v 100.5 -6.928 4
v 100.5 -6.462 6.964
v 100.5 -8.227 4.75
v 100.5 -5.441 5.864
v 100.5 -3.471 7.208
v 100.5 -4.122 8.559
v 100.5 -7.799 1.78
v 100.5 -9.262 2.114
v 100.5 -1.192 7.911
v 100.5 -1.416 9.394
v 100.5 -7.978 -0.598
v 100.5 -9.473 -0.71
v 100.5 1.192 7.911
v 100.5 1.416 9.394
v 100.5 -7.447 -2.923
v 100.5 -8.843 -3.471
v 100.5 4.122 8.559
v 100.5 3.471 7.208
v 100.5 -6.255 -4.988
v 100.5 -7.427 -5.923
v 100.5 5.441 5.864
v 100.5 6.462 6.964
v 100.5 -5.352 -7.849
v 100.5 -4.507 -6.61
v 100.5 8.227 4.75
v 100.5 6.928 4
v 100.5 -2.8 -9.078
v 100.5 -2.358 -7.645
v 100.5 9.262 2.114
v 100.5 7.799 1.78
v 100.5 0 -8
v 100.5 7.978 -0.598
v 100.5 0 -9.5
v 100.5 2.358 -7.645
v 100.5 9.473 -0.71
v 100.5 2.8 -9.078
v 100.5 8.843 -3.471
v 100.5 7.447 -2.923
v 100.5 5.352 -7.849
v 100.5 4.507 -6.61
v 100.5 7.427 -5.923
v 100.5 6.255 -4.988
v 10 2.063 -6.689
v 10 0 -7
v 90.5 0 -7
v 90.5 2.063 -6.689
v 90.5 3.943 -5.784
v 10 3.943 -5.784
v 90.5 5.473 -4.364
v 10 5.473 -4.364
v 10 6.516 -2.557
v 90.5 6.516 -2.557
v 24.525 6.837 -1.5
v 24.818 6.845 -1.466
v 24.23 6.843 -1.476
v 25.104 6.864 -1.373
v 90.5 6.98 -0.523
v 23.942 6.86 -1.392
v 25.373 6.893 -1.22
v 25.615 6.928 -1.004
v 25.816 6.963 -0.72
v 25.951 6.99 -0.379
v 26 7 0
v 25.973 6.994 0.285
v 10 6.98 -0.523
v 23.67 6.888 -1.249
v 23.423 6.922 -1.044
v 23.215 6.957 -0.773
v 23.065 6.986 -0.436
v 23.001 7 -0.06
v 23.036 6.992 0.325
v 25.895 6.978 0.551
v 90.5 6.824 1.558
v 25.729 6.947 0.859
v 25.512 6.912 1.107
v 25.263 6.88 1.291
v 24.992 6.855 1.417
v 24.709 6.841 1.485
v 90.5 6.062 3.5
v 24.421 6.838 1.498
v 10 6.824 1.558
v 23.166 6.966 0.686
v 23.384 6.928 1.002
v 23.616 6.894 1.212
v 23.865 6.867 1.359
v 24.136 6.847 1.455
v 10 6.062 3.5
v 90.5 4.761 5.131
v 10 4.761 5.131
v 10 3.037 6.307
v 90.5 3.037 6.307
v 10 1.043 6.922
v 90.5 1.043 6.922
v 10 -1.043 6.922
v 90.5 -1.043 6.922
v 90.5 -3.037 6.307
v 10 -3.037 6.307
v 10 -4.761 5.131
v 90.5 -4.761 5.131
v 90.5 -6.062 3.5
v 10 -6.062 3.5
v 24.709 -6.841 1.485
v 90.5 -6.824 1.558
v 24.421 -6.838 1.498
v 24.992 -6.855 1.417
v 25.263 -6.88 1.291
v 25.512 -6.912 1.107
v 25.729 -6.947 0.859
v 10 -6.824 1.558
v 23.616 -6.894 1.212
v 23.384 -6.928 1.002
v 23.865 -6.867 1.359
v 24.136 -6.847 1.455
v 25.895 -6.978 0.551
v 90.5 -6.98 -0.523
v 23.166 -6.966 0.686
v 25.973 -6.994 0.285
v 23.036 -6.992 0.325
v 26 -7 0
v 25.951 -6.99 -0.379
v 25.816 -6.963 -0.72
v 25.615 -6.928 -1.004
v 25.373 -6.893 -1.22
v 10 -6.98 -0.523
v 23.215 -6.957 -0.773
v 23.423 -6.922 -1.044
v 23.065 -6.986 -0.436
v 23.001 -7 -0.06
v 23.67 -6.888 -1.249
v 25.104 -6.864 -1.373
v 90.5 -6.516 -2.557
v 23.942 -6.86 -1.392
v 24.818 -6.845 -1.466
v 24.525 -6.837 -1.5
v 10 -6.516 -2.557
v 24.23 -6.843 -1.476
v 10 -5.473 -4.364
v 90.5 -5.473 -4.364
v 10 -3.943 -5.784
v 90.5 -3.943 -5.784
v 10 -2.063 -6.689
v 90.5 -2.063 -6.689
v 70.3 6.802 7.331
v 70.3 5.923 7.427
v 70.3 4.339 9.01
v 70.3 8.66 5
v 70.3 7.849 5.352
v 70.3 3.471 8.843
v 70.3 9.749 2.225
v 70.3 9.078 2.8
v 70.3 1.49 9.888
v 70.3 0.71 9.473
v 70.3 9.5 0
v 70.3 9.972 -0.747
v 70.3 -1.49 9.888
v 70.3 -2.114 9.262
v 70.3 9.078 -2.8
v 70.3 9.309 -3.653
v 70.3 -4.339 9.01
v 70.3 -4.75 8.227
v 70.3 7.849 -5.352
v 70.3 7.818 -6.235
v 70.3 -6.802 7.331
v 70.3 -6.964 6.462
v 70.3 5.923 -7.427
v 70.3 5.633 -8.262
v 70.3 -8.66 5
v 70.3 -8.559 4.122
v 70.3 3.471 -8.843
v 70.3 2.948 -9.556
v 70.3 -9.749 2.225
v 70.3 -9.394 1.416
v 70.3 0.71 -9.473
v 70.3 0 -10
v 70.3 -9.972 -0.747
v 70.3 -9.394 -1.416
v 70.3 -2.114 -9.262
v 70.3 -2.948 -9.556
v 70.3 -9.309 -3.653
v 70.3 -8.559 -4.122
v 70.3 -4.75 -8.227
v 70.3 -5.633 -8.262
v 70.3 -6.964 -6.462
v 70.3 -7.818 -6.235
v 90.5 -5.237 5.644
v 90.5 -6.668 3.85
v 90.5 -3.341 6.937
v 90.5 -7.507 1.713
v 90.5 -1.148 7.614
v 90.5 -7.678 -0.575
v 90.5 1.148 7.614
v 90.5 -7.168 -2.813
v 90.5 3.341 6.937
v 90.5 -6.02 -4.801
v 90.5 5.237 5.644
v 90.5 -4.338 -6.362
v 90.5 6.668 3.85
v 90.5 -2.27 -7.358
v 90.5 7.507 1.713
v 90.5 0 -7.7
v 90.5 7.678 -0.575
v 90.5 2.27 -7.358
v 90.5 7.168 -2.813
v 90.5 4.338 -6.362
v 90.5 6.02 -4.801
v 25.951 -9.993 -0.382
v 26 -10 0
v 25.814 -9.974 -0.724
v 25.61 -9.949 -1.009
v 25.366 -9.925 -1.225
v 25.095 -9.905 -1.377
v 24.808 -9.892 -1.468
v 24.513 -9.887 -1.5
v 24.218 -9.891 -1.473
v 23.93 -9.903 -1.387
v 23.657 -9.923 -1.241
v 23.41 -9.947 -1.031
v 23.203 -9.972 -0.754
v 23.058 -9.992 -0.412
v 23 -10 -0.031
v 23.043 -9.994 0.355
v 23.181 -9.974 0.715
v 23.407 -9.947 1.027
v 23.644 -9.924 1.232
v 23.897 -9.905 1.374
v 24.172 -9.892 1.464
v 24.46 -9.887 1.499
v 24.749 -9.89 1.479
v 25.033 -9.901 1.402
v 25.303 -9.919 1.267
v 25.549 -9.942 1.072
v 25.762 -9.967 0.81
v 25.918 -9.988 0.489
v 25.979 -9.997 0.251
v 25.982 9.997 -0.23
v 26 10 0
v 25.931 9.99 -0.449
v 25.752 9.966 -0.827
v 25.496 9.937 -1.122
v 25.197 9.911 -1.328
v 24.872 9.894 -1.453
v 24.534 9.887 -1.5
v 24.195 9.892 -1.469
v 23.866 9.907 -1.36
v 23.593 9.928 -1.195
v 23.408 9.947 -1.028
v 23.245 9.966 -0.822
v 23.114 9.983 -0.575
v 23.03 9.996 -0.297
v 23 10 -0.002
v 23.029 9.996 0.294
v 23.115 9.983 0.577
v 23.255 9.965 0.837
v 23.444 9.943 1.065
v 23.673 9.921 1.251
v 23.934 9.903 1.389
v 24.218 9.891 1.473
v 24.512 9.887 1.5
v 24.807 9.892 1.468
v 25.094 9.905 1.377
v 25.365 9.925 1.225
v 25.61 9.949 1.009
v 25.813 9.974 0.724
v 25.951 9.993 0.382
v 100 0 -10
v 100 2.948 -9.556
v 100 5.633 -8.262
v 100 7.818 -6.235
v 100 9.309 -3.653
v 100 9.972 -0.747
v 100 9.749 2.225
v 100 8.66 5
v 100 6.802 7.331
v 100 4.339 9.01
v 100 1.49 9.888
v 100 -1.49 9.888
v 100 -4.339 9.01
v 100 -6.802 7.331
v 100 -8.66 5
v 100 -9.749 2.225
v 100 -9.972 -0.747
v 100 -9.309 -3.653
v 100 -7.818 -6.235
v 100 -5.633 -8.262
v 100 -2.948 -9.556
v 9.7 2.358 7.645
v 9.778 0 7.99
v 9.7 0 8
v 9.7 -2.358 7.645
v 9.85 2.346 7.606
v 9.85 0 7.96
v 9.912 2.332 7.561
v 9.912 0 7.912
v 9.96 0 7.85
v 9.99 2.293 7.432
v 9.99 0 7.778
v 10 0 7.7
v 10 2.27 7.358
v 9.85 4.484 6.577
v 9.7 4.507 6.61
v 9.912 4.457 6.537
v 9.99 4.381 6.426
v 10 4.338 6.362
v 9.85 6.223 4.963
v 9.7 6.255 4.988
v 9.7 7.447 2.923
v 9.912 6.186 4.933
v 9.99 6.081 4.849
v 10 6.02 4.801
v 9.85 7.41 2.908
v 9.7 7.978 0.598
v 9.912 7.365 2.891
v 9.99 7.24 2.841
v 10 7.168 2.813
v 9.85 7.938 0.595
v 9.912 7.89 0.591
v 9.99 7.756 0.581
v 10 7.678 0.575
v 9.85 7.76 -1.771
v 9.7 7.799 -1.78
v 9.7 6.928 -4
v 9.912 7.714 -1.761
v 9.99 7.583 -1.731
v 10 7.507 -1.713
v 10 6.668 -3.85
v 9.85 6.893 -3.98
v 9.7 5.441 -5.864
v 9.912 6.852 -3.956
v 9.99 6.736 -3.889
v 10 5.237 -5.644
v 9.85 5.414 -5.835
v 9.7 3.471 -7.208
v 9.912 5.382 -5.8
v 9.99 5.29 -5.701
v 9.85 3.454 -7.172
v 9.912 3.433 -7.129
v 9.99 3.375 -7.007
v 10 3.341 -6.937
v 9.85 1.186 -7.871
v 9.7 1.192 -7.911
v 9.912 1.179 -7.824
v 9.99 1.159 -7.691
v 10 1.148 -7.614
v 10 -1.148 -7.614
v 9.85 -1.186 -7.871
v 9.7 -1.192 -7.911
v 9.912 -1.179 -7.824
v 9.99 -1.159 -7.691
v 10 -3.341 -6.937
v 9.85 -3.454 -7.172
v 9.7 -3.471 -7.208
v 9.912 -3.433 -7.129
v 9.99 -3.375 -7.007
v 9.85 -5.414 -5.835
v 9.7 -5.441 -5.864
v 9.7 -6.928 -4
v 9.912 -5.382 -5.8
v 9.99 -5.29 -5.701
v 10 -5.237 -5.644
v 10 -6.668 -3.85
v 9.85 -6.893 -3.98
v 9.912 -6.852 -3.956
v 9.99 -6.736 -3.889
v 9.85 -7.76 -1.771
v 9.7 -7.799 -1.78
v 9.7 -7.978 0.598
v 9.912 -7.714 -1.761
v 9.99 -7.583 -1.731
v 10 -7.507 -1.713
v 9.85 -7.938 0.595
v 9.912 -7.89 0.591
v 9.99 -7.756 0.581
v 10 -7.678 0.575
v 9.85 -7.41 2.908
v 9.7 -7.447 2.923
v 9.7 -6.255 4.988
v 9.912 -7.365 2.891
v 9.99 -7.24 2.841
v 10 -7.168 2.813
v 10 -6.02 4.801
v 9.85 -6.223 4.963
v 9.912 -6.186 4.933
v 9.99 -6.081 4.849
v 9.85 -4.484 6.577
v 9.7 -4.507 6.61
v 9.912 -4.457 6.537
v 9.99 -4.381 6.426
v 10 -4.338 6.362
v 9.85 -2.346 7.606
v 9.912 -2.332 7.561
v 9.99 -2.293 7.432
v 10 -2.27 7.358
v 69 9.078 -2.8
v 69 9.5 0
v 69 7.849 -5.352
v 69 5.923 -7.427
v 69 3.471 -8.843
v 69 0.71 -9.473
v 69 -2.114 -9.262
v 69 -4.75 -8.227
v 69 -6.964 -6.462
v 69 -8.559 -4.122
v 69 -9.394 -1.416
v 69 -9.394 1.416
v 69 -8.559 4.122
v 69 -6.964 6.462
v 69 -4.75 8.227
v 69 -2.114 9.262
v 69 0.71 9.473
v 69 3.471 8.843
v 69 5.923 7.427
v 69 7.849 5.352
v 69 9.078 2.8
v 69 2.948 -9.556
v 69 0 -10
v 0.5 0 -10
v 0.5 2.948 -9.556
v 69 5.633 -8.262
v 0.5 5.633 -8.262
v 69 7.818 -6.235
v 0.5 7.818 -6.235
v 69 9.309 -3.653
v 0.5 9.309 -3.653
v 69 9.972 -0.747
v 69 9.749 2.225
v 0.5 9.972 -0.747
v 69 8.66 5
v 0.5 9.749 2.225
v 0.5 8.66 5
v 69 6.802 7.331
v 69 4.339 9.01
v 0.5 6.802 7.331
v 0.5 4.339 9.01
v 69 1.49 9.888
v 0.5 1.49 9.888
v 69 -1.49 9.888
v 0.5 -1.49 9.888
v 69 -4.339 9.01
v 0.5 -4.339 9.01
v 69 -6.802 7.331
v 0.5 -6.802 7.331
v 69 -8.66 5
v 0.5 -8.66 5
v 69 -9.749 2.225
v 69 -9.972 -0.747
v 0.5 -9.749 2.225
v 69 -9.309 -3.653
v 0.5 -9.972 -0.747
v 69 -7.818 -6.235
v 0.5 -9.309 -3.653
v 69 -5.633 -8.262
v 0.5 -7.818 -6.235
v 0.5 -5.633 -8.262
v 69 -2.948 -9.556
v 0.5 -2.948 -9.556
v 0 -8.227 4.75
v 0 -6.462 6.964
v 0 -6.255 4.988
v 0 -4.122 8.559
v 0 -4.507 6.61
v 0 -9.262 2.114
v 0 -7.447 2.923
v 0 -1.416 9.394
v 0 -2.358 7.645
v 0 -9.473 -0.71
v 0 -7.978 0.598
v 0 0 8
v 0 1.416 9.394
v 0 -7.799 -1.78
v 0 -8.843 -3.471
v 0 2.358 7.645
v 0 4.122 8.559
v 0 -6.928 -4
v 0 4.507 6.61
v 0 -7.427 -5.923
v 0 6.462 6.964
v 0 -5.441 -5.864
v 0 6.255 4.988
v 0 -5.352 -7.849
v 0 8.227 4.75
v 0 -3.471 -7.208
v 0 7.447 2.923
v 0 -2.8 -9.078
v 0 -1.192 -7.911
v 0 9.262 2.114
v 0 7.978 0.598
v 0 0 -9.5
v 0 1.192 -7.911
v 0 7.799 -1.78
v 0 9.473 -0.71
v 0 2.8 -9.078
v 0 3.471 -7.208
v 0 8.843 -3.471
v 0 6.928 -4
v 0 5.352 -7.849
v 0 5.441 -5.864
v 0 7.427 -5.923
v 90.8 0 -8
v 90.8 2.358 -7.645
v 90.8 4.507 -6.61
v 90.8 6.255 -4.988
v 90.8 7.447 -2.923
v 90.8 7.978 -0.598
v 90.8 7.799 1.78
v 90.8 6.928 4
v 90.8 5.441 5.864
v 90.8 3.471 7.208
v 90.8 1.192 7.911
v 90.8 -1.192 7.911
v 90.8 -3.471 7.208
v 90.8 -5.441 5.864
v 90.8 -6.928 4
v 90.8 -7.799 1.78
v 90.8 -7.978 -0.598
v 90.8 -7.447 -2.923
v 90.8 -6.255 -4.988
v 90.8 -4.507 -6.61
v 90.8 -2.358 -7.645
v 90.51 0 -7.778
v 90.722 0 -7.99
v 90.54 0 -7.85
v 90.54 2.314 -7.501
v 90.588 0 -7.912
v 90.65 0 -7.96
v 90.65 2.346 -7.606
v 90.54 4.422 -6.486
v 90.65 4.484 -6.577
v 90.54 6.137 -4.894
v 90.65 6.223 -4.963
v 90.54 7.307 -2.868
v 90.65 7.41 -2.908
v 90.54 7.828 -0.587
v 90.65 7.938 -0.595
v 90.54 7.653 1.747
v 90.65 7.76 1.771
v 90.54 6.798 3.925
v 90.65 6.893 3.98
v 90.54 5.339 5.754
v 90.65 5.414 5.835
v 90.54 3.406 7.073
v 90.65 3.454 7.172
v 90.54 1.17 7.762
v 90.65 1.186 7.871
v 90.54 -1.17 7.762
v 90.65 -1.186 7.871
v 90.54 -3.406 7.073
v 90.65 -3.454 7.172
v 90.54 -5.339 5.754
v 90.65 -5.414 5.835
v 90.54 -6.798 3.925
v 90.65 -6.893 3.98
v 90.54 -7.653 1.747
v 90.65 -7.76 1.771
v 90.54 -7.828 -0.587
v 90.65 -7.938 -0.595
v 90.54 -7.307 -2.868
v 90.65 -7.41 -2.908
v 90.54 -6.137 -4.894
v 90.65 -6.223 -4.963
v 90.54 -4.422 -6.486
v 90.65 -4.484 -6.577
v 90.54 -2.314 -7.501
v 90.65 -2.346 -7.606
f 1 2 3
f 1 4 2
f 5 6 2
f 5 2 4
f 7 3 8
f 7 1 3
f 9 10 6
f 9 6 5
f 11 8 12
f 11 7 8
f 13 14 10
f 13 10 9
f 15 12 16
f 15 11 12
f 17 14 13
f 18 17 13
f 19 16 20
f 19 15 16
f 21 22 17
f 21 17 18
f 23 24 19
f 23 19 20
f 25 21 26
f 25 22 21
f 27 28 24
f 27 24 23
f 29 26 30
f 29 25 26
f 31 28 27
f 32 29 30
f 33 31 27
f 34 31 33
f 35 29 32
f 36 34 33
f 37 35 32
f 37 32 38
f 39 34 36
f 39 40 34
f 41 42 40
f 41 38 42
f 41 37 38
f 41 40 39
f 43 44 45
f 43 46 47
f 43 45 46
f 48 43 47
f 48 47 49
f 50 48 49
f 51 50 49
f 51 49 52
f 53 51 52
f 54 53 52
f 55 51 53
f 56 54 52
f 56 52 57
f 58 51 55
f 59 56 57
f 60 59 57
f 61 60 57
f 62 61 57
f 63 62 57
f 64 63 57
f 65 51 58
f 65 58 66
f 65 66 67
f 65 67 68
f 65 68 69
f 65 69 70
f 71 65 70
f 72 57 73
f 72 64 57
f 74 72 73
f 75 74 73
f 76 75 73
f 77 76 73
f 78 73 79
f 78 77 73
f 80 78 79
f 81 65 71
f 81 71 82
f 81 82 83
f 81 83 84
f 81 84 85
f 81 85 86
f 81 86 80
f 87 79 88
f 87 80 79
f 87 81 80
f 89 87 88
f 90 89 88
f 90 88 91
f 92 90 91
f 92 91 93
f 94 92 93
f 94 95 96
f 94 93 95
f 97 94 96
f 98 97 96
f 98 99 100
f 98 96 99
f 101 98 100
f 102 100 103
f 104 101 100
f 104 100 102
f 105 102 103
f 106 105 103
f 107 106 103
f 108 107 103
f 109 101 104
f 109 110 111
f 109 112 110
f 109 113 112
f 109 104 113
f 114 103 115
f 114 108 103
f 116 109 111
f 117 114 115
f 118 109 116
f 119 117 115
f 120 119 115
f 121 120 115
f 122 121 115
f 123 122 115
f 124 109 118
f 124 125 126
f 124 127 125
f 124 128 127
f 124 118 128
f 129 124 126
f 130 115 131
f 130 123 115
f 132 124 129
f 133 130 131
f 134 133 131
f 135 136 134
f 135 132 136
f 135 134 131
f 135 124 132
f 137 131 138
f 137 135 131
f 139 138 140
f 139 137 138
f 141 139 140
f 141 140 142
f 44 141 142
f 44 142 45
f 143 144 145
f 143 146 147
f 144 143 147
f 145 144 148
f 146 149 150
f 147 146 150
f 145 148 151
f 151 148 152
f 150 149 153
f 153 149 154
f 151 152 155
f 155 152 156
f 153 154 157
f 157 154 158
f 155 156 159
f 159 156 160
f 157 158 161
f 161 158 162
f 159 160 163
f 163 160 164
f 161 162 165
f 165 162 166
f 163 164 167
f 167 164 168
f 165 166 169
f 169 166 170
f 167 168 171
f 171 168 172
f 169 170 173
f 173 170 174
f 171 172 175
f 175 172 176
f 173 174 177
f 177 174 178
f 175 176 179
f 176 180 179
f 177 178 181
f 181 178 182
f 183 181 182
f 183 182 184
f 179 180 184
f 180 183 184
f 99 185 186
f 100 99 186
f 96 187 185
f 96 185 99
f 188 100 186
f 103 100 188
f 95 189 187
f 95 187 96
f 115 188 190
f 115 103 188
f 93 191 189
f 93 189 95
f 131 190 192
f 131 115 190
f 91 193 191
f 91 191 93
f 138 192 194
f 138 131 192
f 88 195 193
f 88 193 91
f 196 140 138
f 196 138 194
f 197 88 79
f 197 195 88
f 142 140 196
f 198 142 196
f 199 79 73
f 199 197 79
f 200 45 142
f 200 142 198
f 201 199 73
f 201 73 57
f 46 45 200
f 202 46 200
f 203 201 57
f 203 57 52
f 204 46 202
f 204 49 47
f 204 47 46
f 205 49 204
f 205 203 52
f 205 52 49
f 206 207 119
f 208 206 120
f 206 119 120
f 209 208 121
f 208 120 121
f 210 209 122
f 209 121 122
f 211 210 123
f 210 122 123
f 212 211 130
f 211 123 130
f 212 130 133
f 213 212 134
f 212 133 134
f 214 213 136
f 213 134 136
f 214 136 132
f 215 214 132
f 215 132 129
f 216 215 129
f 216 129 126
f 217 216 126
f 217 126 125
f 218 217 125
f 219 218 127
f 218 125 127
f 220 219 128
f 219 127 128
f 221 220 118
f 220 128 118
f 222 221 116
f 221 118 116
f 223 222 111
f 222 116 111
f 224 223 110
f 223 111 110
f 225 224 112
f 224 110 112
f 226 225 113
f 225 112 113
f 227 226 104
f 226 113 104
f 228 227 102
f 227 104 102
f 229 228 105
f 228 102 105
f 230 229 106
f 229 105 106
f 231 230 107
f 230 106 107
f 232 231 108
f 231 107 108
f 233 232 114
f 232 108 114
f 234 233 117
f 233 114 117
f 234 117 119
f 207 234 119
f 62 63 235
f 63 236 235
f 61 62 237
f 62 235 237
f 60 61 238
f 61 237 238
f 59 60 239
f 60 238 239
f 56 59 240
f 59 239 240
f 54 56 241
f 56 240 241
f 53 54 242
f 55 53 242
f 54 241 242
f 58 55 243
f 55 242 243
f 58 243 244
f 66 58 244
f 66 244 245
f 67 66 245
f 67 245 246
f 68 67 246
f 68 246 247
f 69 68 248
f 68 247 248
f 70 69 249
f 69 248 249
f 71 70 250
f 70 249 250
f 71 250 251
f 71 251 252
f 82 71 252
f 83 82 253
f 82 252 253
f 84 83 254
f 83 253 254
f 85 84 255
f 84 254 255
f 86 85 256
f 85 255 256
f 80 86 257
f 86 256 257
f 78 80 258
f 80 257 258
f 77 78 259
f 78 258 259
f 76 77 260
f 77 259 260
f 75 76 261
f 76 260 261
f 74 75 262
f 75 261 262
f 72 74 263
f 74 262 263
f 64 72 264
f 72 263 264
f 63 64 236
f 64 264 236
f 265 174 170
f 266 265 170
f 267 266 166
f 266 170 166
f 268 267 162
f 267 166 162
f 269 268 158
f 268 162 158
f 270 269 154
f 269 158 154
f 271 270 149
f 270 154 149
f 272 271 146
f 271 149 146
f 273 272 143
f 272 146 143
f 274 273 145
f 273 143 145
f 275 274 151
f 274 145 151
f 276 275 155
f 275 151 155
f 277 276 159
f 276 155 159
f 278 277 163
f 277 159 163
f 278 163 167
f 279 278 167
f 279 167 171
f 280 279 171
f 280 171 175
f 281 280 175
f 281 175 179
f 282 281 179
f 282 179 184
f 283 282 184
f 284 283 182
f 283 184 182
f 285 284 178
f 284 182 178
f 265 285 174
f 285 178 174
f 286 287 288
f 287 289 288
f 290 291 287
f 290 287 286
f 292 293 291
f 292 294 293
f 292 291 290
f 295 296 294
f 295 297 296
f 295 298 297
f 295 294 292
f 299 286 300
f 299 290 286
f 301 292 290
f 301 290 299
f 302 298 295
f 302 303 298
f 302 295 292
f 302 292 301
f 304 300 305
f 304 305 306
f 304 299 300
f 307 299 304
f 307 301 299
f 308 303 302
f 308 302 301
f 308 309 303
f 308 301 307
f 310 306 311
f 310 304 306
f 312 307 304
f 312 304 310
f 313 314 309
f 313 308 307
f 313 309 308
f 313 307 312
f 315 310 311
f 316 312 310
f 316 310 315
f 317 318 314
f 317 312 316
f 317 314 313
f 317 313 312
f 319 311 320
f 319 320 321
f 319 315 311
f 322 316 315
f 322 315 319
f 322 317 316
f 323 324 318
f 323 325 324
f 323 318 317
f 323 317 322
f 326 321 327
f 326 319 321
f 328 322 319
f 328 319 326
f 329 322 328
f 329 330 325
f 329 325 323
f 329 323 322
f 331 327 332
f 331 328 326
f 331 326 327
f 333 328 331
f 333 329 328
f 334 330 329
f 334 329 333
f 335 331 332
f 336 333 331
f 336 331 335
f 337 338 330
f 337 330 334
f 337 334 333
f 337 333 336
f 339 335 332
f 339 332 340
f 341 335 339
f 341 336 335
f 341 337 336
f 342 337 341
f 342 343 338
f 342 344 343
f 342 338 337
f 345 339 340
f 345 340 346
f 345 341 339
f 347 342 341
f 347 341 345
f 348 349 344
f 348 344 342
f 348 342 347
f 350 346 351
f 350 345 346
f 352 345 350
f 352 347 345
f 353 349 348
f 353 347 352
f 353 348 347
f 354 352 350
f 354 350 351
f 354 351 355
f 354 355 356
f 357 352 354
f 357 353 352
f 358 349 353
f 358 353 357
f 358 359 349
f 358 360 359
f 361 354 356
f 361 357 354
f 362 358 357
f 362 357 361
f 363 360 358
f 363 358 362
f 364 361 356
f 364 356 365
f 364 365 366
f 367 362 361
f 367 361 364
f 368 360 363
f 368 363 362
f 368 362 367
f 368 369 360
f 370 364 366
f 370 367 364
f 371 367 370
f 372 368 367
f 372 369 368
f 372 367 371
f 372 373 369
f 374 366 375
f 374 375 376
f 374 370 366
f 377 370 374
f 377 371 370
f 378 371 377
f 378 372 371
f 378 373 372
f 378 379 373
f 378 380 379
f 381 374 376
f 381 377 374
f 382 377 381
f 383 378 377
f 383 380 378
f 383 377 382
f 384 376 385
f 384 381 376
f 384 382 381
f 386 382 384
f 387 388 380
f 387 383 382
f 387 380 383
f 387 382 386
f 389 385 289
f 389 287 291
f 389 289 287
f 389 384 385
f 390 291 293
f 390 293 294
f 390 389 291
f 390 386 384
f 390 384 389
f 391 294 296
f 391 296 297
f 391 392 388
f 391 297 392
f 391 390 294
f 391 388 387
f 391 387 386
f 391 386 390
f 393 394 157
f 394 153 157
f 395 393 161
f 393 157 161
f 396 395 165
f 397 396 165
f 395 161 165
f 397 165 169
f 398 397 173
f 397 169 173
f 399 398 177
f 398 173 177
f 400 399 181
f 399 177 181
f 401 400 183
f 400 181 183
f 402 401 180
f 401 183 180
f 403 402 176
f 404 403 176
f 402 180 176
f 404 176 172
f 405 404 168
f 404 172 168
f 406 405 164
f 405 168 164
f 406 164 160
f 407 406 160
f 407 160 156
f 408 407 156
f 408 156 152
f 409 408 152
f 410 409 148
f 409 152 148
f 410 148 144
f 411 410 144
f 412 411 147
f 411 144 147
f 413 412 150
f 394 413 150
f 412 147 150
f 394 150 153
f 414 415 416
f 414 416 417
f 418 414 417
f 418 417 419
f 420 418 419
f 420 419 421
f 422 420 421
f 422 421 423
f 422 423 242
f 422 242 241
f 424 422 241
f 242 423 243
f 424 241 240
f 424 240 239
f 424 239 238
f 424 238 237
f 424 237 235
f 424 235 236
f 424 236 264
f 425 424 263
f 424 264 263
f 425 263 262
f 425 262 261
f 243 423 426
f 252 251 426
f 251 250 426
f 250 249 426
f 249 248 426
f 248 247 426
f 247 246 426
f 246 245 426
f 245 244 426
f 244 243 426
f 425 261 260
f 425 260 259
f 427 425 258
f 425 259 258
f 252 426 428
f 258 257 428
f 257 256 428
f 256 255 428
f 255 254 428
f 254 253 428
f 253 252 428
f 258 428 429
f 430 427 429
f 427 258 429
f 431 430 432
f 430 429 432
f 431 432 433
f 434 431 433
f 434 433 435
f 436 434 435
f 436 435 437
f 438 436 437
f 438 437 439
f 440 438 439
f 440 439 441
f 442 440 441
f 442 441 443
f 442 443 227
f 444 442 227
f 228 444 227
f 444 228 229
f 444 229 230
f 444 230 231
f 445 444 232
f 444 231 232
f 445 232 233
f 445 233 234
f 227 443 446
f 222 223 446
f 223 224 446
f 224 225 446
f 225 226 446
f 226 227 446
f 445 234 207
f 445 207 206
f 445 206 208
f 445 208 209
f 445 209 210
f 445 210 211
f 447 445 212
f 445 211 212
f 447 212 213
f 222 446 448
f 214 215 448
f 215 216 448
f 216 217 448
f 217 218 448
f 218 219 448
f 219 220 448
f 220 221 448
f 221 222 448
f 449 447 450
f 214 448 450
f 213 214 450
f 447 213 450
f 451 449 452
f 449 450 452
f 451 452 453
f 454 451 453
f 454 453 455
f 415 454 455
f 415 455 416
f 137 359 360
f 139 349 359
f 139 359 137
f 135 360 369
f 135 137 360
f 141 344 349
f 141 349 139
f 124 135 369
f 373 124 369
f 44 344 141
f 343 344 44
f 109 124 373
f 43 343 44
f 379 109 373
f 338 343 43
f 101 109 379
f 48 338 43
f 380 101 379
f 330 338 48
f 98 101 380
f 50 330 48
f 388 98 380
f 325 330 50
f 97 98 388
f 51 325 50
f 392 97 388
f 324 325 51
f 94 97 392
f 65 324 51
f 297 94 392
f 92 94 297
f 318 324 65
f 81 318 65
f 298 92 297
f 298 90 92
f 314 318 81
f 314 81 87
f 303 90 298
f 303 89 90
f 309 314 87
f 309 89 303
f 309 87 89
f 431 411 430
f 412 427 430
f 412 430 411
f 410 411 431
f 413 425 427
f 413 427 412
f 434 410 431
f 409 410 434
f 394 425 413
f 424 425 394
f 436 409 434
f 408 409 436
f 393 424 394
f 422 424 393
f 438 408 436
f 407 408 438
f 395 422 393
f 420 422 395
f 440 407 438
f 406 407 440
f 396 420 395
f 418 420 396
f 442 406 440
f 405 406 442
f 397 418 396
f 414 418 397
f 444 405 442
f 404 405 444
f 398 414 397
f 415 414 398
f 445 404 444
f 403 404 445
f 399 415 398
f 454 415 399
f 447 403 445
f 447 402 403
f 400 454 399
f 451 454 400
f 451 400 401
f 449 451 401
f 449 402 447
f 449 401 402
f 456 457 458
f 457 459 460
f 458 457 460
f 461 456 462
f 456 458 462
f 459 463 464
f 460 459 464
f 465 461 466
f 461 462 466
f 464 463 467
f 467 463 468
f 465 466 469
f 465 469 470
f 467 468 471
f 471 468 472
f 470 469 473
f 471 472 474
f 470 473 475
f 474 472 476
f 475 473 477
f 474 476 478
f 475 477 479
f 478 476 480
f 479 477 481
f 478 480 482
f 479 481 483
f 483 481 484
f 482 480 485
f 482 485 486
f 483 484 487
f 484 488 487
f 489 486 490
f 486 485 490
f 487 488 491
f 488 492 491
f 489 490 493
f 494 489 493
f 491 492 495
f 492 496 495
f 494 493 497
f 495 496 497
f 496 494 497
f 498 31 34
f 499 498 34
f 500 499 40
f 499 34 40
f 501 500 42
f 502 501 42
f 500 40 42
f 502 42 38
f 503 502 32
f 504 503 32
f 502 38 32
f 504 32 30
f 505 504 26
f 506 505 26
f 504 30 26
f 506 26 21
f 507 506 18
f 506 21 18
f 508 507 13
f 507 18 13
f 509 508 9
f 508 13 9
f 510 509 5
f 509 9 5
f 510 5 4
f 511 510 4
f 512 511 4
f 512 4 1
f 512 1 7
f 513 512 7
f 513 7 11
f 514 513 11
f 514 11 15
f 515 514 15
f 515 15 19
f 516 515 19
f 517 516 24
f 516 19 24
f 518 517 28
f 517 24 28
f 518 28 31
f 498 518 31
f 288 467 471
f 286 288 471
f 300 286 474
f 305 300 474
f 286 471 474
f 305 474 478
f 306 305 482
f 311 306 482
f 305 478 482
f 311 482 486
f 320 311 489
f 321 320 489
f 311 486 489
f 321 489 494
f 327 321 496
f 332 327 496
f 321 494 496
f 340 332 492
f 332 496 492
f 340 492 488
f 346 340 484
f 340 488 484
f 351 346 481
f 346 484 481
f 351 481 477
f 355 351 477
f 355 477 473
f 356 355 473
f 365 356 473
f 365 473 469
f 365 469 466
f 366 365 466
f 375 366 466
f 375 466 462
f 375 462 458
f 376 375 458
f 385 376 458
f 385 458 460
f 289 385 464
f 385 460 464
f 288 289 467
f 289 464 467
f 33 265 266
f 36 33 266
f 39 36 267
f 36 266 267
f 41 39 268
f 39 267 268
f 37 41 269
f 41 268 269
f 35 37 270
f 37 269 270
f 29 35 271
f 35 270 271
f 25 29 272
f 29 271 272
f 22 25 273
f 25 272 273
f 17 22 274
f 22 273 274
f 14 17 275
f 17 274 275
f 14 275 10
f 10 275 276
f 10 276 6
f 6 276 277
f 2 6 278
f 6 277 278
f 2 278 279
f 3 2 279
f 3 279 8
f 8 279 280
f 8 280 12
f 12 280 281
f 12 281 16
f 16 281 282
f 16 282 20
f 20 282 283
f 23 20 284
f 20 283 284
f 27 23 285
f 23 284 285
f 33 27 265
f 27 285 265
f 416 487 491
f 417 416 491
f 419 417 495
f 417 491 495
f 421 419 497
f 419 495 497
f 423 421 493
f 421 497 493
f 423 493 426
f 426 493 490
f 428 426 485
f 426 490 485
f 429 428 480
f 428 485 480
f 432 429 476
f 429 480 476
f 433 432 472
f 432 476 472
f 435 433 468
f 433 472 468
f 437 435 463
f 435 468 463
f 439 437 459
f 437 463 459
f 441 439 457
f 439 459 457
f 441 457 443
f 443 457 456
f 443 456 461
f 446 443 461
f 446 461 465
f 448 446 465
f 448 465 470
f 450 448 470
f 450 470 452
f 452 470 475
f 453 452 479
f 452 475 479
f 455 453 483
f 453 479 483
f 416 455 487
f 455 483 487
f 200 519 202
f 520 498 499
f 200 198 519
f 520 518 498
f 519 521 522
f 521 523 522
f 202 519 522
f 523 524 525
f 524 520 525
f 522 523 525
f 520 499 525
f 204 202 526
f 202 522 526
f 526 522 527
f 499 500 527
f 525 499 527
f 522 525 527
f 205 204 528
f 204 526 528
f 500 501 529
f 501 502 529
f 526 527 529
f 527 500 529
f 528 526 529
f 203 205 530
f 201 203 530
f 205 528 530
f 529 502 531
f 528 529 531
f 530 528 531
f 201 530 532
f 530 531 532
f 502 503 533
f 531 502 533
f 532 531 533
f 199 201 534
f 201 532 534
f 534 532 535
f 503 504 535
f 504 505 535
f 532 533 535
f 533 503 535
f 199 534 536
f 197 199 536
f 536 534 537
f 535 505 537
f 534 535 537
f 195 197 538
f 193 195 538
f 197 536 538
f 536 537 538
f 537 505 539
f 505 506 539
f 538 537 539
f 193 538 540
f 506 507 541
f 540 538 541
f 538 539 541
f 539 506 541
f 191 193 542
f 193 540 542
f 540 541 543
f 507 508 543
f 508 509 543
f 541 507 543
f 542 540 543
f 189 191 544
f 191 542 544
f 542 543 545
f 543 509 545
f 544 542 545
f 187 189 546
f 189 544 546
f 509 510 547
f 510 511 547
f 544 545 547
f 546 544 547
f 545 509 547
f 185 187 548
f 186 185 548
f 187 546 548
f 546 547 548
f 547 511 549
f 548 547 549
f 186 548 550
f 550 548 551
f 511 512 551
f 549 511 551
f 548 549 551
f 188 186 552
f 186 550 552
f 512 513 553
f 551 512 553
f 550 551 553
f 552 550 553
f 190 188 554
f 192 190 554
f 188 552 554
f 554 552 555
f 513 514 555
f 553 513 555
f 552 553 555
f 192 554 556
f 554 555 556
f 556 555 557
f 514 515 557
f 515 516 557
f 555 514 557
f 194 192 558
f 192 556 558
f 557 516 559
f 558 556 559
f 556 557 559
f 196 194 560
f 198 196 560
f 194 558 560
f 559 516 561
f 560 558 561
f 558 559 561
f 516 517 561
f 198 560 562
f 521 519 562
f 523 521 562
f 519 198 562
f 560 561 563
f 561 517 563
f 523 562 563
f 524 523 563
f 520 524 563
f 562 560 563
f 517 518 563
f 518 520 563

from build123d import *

# Parameters (mm, degrees)
SKETCH1_R           = 10
SKETCH1_R_2         = 7
BOSS_EXTRUDE1_DEPTH = 100.5
SKETCH2_R           = 8
CUT_EXTRUDE1_DEPTH  = 10
SKETCH3_R           = 8
CUT_EXTRUDE2_DEPTH  = 10
SKETCH4_W           = 1.3
SKETCH4_H           = 0.5
SKETCH5_R           = 1.5
CUT_EXTRUDE3_DEPTH  = 10
CHAMFER1_SIZE       = 0.5
FILLET1_R           = 0.3


with BuildPart() as part:
    # Sketch1 → Boss-Extrude1 (new body)
    with BuildSketch(Plane(origin=(0, 0, 0), x_dir=(0, 0, -1), z_dir=(1, 0, 0))):
        Circle(SKETCH1_R)
        Circle(SKETCH1_R_2, mode=Mode.SUBTRACT)
    extrude(amount=BOSS_EXTRUDE1_DEPTH)

    # Sketch2 → Cut-Extrude1 (cut)
    with BuildSketch(Plane.ZY):
        Circle(SKETCH2_R)
    extrude(amount=-CUT_EXTRUDE1_DEPTH, mode=Mode.SUBTRACT)

    # Sketch3 → Cut-Extrude2 (cut)
    with BuildSketch(Plane(origin=(100.5, 0, 0), x_dir=(0, 0, -1), z_dir=(1, 0, 0))):
        Circle(SKETCH3_R)
    extrude(amount=-CUT_EXTRUDE2_DEPTH, mode=Mode.SUBTRACT)

    # Sketch4 → Cut-Revolve1 (revolve, cut)
    with BuildSketch(Plane.XY):
        with Locations((69.65, 9.75)):
            Rectangle(SKETCH4_W, SKETCH4_H)
    revolve(axis=Axis((100.5, 0, 0), (-1, 0, 0)), mode=Mode.SUBTRACT)

    # Sketch5 → Cut-Extrude3 (cut, symmetric)
    with BuildSketch(Plane(origin=(0, 0, 0), x_dir=(1, 0, 0), z_dir=(0, 1, 0))):
        with Locations((24.5, 0)):
            Circle(SKETCH5_R)
    extrude(amount=CUT_EXTRUDE3_DEPTH, both=True, mode=Mode.SUBTRACT)

    # Chamfer1
    chamfer1_edges = [part.edges().sort_by_distance(p)[0] for p in [
        (0, 0, 10),
        (100.5, 0, 10),
    ]]
    chamfer(chamfer1_edges, length=CHAMFER1_SIZE)

    # Fillet1
    fillet1_edges = [part.edges().sort_by_distance(p)[0] for p in [
        (10, 0, -8),
        (90.5, 0, 8),
    ]]
    fillet(fillet1_edges, radius=FILLET1_R)


solid = part.part
